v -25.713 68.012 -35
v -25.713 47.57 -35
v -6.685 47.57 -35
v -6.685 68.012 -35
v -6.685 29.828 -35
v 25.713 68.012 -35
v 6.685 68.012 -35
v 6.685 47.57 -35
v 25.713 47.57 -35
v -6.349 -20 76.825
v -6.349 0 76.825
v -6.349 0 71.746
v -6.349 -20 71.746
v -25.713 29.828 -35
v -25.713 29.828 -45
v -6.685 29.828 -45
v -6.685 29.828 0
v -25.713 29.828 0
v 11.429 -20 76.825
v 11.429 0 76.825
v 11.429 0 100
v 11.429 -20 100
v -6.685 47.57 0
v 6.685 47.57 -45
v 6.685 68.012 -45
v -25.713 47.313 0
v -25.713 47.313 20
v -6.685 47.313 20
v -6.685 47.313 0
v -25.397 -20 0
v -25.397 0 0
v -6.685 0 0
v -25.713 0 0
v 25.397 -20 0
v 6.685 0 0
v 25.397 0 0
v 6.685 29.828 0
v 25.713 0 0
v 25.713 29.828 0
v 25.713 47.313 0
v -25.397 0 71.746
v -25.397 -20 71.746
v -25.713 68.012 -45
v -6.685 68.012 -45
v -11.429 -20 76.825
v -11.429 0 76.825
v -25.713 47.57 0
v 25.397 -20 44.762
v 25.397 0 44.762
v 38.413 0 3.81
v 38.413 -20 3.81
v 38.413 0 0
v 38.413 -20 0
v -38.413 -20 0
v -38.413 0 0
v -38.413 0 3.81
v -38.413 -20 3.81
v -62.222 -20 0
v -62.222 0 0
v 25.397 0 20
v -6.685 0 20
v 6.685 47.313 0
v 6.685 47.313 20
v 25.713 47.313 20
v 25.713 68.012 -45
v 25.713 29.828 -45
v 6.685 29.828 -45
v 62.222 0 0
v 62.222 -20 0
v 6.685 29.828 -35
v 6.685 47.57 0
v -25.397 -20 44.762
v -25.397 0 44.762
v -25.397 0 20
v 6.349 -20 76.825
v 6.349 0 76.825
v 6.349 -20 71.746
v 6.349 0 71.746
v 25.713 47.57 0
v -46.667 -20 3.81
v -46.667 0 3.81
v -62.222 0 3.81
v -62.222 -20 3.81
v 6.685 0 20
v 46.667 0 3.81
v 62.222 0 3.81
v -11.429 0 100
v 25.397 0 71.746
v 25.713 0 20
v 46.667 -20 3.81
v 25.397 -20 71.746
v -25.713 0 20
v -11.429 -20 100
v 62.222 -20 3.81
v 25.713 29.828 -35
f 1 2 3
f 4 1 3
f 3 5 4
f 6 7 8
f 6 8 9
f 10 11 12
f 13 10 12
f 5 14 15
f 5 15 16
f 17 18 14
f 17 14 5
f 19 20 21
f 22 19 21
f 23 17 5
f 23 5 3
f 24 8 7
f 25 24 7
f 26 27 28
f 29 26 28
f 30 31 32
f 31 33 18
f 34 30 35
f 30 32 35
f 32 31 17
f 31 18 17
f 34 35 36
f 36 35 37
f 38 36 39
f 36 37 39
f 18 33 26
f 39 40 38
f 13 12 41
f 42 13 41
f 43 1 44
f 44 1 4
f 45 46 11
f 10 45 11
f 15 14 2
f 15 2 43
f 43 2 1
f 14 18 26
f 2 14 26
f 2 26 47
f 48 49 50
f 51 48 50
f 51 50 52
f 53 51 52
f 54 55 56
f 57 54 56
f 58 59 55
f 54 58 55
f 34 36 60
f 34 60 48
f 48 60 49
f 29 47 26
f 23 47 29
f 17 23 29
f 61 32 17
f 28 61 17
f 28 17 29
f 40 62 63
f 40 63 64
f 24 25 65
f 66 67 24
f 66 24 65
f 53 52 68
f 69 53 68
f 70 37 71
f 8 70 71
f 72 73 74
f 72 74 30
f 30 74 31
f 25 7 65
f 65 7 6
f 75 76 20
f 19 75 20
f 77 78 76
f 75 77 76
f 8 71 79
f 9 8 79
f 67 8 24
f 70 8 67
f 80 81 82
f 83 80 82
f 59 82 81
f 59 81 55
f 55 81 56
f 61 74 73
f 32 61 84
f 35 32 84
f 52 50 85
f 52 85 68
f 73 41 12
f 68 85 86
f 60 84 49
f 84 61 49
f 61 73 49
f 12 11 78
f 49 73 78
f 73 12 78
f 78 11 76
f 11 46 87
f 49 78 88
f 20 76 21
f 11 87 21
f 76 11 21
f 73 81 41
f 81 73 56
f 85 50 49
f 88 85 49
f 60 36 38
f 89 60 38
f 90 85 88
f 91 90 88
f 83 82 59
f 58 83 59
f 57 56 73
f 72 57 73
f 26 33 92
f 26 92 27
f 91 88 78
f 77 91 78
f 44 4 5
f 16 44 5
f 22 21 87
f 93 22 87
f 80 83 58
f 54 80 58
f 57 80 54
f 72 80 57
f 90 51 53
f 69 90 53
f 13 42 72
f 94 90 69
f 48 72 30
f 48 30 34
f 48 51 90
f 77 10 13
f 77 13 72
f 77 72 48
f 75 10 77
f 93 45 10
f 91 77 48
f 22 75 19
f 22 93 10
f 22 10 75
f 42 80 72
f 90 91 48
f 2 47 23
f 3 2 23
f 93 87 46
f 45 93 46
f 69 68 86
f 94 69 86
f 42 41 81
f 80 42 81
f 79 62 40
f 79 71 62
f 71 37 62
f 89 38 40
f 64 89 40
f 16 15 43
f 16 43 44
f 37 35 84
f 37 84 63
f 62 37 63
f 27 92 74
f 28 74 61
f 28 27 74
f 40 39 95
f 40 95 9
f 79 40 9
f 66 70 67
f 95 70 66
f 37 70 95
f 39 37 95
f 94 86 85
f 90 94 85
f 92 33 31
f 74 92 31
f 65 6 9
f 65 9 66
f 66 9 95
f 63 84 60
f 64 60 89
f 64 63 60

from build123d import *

# Parameters (mm, degrees)
F1_DEPTH = 20
F2_W     = 19.0279083326
F2_H     = 47.3126359284
F3_DEPTH = 20
F4_W     = 19.0279083326
F4_H     = 17.7422408015
F5_DEPTH = 35
F6_W     = 19.0279087983
F6_H     = 38.1843838841
F6_H_2   = 17.7422408015
F7_DEPTH = 10


# Not quite as in the source:
# - ends of sketch curves that miss each other by under 0.0002 mm in the source are joined


with BuildPart() as f1:
    # F0 (on Front) → F1 (new body)
    with BuildSketch(Plane.XZ):
        Polygon((-6.3491990761, 71.7460297603), (-25.3968193009, 71.7460297603), (-46.6666553218, 3.8095274944), (-62.2222101619, 3.8095274944), (-62.2222101619, 0), (-38.4126887615, 0), (-38.4126887615, 3.8095274944), (-25.3968193009, 44.7619079595), (-25.3968193009, 0), (0, 0), (25.3968193009, 0), (25.3968193009, 44.7619079595), (38.4126887615, 3.8095274944), (38.4126887615, 0), (62.2222101619, 0), (62.2222101619, 3.8095274944), (46.6666553218, 3.8095274944), (25.3968193009, 71.7460297603), (6.3491990761, 71.7460297603), (6.3491990761, 76.8254005194), (11.4285635112, 76.8254005194), (11.4285635112, 100), (0, 100), (-11.4285635112, 100), (-11.4285635112, 76.8254005194), (-6.3491990761, 76.8254005194), align=None)
    extrude(amount=F1_DEPTH)

    # F2 (on Top) → F3 (join)
    with BuildSketch(Plane.XY):
        with Locations((-16.1994355731, 23.6563179642)):
            Rectangle(F2_W, F2_H)
        with Locations((16.1994355731, 23.6563179642)):
            Rectangle(F2_W, F2_H)
    extrude(amount=F3_DEPTH)

    # F4 (on Top) → F5 (join)
    with BuildSketch(Plane.XY):
        with Locations((16.1994318478, 38.6986536905)):
            Rectangle(F4_W, F4_H)
        with Locations((-16.1994318478, 38.6986536905)):
            Rectangle(F4_W, F4_H)
    extrude(amount=-F5_DEPTH)

    # F6 (on face) → F7 (join)
    with BuildSketch(Plane(origin=(0, 0, -35), x_dir=(1, 0, 0), z_dir=(0, 0, -1))):
        Polygon((25.7133860141, -68.0119171739), (25.7133860141, -47.5697740912), (6.6854776815, -47.5697740912), (6.6854772158, -68.0119171739), align=None)
        with Locations((-16.199431615, -48.9197252318)):
            Rectangle(F6_W, F6_H)
        with Locations((16.199431615, -38.6986536905)):
            Rectangle(F6_W, F6_H_2)
    extrude(amount=F7_DEPTH)


solid = f1.part
